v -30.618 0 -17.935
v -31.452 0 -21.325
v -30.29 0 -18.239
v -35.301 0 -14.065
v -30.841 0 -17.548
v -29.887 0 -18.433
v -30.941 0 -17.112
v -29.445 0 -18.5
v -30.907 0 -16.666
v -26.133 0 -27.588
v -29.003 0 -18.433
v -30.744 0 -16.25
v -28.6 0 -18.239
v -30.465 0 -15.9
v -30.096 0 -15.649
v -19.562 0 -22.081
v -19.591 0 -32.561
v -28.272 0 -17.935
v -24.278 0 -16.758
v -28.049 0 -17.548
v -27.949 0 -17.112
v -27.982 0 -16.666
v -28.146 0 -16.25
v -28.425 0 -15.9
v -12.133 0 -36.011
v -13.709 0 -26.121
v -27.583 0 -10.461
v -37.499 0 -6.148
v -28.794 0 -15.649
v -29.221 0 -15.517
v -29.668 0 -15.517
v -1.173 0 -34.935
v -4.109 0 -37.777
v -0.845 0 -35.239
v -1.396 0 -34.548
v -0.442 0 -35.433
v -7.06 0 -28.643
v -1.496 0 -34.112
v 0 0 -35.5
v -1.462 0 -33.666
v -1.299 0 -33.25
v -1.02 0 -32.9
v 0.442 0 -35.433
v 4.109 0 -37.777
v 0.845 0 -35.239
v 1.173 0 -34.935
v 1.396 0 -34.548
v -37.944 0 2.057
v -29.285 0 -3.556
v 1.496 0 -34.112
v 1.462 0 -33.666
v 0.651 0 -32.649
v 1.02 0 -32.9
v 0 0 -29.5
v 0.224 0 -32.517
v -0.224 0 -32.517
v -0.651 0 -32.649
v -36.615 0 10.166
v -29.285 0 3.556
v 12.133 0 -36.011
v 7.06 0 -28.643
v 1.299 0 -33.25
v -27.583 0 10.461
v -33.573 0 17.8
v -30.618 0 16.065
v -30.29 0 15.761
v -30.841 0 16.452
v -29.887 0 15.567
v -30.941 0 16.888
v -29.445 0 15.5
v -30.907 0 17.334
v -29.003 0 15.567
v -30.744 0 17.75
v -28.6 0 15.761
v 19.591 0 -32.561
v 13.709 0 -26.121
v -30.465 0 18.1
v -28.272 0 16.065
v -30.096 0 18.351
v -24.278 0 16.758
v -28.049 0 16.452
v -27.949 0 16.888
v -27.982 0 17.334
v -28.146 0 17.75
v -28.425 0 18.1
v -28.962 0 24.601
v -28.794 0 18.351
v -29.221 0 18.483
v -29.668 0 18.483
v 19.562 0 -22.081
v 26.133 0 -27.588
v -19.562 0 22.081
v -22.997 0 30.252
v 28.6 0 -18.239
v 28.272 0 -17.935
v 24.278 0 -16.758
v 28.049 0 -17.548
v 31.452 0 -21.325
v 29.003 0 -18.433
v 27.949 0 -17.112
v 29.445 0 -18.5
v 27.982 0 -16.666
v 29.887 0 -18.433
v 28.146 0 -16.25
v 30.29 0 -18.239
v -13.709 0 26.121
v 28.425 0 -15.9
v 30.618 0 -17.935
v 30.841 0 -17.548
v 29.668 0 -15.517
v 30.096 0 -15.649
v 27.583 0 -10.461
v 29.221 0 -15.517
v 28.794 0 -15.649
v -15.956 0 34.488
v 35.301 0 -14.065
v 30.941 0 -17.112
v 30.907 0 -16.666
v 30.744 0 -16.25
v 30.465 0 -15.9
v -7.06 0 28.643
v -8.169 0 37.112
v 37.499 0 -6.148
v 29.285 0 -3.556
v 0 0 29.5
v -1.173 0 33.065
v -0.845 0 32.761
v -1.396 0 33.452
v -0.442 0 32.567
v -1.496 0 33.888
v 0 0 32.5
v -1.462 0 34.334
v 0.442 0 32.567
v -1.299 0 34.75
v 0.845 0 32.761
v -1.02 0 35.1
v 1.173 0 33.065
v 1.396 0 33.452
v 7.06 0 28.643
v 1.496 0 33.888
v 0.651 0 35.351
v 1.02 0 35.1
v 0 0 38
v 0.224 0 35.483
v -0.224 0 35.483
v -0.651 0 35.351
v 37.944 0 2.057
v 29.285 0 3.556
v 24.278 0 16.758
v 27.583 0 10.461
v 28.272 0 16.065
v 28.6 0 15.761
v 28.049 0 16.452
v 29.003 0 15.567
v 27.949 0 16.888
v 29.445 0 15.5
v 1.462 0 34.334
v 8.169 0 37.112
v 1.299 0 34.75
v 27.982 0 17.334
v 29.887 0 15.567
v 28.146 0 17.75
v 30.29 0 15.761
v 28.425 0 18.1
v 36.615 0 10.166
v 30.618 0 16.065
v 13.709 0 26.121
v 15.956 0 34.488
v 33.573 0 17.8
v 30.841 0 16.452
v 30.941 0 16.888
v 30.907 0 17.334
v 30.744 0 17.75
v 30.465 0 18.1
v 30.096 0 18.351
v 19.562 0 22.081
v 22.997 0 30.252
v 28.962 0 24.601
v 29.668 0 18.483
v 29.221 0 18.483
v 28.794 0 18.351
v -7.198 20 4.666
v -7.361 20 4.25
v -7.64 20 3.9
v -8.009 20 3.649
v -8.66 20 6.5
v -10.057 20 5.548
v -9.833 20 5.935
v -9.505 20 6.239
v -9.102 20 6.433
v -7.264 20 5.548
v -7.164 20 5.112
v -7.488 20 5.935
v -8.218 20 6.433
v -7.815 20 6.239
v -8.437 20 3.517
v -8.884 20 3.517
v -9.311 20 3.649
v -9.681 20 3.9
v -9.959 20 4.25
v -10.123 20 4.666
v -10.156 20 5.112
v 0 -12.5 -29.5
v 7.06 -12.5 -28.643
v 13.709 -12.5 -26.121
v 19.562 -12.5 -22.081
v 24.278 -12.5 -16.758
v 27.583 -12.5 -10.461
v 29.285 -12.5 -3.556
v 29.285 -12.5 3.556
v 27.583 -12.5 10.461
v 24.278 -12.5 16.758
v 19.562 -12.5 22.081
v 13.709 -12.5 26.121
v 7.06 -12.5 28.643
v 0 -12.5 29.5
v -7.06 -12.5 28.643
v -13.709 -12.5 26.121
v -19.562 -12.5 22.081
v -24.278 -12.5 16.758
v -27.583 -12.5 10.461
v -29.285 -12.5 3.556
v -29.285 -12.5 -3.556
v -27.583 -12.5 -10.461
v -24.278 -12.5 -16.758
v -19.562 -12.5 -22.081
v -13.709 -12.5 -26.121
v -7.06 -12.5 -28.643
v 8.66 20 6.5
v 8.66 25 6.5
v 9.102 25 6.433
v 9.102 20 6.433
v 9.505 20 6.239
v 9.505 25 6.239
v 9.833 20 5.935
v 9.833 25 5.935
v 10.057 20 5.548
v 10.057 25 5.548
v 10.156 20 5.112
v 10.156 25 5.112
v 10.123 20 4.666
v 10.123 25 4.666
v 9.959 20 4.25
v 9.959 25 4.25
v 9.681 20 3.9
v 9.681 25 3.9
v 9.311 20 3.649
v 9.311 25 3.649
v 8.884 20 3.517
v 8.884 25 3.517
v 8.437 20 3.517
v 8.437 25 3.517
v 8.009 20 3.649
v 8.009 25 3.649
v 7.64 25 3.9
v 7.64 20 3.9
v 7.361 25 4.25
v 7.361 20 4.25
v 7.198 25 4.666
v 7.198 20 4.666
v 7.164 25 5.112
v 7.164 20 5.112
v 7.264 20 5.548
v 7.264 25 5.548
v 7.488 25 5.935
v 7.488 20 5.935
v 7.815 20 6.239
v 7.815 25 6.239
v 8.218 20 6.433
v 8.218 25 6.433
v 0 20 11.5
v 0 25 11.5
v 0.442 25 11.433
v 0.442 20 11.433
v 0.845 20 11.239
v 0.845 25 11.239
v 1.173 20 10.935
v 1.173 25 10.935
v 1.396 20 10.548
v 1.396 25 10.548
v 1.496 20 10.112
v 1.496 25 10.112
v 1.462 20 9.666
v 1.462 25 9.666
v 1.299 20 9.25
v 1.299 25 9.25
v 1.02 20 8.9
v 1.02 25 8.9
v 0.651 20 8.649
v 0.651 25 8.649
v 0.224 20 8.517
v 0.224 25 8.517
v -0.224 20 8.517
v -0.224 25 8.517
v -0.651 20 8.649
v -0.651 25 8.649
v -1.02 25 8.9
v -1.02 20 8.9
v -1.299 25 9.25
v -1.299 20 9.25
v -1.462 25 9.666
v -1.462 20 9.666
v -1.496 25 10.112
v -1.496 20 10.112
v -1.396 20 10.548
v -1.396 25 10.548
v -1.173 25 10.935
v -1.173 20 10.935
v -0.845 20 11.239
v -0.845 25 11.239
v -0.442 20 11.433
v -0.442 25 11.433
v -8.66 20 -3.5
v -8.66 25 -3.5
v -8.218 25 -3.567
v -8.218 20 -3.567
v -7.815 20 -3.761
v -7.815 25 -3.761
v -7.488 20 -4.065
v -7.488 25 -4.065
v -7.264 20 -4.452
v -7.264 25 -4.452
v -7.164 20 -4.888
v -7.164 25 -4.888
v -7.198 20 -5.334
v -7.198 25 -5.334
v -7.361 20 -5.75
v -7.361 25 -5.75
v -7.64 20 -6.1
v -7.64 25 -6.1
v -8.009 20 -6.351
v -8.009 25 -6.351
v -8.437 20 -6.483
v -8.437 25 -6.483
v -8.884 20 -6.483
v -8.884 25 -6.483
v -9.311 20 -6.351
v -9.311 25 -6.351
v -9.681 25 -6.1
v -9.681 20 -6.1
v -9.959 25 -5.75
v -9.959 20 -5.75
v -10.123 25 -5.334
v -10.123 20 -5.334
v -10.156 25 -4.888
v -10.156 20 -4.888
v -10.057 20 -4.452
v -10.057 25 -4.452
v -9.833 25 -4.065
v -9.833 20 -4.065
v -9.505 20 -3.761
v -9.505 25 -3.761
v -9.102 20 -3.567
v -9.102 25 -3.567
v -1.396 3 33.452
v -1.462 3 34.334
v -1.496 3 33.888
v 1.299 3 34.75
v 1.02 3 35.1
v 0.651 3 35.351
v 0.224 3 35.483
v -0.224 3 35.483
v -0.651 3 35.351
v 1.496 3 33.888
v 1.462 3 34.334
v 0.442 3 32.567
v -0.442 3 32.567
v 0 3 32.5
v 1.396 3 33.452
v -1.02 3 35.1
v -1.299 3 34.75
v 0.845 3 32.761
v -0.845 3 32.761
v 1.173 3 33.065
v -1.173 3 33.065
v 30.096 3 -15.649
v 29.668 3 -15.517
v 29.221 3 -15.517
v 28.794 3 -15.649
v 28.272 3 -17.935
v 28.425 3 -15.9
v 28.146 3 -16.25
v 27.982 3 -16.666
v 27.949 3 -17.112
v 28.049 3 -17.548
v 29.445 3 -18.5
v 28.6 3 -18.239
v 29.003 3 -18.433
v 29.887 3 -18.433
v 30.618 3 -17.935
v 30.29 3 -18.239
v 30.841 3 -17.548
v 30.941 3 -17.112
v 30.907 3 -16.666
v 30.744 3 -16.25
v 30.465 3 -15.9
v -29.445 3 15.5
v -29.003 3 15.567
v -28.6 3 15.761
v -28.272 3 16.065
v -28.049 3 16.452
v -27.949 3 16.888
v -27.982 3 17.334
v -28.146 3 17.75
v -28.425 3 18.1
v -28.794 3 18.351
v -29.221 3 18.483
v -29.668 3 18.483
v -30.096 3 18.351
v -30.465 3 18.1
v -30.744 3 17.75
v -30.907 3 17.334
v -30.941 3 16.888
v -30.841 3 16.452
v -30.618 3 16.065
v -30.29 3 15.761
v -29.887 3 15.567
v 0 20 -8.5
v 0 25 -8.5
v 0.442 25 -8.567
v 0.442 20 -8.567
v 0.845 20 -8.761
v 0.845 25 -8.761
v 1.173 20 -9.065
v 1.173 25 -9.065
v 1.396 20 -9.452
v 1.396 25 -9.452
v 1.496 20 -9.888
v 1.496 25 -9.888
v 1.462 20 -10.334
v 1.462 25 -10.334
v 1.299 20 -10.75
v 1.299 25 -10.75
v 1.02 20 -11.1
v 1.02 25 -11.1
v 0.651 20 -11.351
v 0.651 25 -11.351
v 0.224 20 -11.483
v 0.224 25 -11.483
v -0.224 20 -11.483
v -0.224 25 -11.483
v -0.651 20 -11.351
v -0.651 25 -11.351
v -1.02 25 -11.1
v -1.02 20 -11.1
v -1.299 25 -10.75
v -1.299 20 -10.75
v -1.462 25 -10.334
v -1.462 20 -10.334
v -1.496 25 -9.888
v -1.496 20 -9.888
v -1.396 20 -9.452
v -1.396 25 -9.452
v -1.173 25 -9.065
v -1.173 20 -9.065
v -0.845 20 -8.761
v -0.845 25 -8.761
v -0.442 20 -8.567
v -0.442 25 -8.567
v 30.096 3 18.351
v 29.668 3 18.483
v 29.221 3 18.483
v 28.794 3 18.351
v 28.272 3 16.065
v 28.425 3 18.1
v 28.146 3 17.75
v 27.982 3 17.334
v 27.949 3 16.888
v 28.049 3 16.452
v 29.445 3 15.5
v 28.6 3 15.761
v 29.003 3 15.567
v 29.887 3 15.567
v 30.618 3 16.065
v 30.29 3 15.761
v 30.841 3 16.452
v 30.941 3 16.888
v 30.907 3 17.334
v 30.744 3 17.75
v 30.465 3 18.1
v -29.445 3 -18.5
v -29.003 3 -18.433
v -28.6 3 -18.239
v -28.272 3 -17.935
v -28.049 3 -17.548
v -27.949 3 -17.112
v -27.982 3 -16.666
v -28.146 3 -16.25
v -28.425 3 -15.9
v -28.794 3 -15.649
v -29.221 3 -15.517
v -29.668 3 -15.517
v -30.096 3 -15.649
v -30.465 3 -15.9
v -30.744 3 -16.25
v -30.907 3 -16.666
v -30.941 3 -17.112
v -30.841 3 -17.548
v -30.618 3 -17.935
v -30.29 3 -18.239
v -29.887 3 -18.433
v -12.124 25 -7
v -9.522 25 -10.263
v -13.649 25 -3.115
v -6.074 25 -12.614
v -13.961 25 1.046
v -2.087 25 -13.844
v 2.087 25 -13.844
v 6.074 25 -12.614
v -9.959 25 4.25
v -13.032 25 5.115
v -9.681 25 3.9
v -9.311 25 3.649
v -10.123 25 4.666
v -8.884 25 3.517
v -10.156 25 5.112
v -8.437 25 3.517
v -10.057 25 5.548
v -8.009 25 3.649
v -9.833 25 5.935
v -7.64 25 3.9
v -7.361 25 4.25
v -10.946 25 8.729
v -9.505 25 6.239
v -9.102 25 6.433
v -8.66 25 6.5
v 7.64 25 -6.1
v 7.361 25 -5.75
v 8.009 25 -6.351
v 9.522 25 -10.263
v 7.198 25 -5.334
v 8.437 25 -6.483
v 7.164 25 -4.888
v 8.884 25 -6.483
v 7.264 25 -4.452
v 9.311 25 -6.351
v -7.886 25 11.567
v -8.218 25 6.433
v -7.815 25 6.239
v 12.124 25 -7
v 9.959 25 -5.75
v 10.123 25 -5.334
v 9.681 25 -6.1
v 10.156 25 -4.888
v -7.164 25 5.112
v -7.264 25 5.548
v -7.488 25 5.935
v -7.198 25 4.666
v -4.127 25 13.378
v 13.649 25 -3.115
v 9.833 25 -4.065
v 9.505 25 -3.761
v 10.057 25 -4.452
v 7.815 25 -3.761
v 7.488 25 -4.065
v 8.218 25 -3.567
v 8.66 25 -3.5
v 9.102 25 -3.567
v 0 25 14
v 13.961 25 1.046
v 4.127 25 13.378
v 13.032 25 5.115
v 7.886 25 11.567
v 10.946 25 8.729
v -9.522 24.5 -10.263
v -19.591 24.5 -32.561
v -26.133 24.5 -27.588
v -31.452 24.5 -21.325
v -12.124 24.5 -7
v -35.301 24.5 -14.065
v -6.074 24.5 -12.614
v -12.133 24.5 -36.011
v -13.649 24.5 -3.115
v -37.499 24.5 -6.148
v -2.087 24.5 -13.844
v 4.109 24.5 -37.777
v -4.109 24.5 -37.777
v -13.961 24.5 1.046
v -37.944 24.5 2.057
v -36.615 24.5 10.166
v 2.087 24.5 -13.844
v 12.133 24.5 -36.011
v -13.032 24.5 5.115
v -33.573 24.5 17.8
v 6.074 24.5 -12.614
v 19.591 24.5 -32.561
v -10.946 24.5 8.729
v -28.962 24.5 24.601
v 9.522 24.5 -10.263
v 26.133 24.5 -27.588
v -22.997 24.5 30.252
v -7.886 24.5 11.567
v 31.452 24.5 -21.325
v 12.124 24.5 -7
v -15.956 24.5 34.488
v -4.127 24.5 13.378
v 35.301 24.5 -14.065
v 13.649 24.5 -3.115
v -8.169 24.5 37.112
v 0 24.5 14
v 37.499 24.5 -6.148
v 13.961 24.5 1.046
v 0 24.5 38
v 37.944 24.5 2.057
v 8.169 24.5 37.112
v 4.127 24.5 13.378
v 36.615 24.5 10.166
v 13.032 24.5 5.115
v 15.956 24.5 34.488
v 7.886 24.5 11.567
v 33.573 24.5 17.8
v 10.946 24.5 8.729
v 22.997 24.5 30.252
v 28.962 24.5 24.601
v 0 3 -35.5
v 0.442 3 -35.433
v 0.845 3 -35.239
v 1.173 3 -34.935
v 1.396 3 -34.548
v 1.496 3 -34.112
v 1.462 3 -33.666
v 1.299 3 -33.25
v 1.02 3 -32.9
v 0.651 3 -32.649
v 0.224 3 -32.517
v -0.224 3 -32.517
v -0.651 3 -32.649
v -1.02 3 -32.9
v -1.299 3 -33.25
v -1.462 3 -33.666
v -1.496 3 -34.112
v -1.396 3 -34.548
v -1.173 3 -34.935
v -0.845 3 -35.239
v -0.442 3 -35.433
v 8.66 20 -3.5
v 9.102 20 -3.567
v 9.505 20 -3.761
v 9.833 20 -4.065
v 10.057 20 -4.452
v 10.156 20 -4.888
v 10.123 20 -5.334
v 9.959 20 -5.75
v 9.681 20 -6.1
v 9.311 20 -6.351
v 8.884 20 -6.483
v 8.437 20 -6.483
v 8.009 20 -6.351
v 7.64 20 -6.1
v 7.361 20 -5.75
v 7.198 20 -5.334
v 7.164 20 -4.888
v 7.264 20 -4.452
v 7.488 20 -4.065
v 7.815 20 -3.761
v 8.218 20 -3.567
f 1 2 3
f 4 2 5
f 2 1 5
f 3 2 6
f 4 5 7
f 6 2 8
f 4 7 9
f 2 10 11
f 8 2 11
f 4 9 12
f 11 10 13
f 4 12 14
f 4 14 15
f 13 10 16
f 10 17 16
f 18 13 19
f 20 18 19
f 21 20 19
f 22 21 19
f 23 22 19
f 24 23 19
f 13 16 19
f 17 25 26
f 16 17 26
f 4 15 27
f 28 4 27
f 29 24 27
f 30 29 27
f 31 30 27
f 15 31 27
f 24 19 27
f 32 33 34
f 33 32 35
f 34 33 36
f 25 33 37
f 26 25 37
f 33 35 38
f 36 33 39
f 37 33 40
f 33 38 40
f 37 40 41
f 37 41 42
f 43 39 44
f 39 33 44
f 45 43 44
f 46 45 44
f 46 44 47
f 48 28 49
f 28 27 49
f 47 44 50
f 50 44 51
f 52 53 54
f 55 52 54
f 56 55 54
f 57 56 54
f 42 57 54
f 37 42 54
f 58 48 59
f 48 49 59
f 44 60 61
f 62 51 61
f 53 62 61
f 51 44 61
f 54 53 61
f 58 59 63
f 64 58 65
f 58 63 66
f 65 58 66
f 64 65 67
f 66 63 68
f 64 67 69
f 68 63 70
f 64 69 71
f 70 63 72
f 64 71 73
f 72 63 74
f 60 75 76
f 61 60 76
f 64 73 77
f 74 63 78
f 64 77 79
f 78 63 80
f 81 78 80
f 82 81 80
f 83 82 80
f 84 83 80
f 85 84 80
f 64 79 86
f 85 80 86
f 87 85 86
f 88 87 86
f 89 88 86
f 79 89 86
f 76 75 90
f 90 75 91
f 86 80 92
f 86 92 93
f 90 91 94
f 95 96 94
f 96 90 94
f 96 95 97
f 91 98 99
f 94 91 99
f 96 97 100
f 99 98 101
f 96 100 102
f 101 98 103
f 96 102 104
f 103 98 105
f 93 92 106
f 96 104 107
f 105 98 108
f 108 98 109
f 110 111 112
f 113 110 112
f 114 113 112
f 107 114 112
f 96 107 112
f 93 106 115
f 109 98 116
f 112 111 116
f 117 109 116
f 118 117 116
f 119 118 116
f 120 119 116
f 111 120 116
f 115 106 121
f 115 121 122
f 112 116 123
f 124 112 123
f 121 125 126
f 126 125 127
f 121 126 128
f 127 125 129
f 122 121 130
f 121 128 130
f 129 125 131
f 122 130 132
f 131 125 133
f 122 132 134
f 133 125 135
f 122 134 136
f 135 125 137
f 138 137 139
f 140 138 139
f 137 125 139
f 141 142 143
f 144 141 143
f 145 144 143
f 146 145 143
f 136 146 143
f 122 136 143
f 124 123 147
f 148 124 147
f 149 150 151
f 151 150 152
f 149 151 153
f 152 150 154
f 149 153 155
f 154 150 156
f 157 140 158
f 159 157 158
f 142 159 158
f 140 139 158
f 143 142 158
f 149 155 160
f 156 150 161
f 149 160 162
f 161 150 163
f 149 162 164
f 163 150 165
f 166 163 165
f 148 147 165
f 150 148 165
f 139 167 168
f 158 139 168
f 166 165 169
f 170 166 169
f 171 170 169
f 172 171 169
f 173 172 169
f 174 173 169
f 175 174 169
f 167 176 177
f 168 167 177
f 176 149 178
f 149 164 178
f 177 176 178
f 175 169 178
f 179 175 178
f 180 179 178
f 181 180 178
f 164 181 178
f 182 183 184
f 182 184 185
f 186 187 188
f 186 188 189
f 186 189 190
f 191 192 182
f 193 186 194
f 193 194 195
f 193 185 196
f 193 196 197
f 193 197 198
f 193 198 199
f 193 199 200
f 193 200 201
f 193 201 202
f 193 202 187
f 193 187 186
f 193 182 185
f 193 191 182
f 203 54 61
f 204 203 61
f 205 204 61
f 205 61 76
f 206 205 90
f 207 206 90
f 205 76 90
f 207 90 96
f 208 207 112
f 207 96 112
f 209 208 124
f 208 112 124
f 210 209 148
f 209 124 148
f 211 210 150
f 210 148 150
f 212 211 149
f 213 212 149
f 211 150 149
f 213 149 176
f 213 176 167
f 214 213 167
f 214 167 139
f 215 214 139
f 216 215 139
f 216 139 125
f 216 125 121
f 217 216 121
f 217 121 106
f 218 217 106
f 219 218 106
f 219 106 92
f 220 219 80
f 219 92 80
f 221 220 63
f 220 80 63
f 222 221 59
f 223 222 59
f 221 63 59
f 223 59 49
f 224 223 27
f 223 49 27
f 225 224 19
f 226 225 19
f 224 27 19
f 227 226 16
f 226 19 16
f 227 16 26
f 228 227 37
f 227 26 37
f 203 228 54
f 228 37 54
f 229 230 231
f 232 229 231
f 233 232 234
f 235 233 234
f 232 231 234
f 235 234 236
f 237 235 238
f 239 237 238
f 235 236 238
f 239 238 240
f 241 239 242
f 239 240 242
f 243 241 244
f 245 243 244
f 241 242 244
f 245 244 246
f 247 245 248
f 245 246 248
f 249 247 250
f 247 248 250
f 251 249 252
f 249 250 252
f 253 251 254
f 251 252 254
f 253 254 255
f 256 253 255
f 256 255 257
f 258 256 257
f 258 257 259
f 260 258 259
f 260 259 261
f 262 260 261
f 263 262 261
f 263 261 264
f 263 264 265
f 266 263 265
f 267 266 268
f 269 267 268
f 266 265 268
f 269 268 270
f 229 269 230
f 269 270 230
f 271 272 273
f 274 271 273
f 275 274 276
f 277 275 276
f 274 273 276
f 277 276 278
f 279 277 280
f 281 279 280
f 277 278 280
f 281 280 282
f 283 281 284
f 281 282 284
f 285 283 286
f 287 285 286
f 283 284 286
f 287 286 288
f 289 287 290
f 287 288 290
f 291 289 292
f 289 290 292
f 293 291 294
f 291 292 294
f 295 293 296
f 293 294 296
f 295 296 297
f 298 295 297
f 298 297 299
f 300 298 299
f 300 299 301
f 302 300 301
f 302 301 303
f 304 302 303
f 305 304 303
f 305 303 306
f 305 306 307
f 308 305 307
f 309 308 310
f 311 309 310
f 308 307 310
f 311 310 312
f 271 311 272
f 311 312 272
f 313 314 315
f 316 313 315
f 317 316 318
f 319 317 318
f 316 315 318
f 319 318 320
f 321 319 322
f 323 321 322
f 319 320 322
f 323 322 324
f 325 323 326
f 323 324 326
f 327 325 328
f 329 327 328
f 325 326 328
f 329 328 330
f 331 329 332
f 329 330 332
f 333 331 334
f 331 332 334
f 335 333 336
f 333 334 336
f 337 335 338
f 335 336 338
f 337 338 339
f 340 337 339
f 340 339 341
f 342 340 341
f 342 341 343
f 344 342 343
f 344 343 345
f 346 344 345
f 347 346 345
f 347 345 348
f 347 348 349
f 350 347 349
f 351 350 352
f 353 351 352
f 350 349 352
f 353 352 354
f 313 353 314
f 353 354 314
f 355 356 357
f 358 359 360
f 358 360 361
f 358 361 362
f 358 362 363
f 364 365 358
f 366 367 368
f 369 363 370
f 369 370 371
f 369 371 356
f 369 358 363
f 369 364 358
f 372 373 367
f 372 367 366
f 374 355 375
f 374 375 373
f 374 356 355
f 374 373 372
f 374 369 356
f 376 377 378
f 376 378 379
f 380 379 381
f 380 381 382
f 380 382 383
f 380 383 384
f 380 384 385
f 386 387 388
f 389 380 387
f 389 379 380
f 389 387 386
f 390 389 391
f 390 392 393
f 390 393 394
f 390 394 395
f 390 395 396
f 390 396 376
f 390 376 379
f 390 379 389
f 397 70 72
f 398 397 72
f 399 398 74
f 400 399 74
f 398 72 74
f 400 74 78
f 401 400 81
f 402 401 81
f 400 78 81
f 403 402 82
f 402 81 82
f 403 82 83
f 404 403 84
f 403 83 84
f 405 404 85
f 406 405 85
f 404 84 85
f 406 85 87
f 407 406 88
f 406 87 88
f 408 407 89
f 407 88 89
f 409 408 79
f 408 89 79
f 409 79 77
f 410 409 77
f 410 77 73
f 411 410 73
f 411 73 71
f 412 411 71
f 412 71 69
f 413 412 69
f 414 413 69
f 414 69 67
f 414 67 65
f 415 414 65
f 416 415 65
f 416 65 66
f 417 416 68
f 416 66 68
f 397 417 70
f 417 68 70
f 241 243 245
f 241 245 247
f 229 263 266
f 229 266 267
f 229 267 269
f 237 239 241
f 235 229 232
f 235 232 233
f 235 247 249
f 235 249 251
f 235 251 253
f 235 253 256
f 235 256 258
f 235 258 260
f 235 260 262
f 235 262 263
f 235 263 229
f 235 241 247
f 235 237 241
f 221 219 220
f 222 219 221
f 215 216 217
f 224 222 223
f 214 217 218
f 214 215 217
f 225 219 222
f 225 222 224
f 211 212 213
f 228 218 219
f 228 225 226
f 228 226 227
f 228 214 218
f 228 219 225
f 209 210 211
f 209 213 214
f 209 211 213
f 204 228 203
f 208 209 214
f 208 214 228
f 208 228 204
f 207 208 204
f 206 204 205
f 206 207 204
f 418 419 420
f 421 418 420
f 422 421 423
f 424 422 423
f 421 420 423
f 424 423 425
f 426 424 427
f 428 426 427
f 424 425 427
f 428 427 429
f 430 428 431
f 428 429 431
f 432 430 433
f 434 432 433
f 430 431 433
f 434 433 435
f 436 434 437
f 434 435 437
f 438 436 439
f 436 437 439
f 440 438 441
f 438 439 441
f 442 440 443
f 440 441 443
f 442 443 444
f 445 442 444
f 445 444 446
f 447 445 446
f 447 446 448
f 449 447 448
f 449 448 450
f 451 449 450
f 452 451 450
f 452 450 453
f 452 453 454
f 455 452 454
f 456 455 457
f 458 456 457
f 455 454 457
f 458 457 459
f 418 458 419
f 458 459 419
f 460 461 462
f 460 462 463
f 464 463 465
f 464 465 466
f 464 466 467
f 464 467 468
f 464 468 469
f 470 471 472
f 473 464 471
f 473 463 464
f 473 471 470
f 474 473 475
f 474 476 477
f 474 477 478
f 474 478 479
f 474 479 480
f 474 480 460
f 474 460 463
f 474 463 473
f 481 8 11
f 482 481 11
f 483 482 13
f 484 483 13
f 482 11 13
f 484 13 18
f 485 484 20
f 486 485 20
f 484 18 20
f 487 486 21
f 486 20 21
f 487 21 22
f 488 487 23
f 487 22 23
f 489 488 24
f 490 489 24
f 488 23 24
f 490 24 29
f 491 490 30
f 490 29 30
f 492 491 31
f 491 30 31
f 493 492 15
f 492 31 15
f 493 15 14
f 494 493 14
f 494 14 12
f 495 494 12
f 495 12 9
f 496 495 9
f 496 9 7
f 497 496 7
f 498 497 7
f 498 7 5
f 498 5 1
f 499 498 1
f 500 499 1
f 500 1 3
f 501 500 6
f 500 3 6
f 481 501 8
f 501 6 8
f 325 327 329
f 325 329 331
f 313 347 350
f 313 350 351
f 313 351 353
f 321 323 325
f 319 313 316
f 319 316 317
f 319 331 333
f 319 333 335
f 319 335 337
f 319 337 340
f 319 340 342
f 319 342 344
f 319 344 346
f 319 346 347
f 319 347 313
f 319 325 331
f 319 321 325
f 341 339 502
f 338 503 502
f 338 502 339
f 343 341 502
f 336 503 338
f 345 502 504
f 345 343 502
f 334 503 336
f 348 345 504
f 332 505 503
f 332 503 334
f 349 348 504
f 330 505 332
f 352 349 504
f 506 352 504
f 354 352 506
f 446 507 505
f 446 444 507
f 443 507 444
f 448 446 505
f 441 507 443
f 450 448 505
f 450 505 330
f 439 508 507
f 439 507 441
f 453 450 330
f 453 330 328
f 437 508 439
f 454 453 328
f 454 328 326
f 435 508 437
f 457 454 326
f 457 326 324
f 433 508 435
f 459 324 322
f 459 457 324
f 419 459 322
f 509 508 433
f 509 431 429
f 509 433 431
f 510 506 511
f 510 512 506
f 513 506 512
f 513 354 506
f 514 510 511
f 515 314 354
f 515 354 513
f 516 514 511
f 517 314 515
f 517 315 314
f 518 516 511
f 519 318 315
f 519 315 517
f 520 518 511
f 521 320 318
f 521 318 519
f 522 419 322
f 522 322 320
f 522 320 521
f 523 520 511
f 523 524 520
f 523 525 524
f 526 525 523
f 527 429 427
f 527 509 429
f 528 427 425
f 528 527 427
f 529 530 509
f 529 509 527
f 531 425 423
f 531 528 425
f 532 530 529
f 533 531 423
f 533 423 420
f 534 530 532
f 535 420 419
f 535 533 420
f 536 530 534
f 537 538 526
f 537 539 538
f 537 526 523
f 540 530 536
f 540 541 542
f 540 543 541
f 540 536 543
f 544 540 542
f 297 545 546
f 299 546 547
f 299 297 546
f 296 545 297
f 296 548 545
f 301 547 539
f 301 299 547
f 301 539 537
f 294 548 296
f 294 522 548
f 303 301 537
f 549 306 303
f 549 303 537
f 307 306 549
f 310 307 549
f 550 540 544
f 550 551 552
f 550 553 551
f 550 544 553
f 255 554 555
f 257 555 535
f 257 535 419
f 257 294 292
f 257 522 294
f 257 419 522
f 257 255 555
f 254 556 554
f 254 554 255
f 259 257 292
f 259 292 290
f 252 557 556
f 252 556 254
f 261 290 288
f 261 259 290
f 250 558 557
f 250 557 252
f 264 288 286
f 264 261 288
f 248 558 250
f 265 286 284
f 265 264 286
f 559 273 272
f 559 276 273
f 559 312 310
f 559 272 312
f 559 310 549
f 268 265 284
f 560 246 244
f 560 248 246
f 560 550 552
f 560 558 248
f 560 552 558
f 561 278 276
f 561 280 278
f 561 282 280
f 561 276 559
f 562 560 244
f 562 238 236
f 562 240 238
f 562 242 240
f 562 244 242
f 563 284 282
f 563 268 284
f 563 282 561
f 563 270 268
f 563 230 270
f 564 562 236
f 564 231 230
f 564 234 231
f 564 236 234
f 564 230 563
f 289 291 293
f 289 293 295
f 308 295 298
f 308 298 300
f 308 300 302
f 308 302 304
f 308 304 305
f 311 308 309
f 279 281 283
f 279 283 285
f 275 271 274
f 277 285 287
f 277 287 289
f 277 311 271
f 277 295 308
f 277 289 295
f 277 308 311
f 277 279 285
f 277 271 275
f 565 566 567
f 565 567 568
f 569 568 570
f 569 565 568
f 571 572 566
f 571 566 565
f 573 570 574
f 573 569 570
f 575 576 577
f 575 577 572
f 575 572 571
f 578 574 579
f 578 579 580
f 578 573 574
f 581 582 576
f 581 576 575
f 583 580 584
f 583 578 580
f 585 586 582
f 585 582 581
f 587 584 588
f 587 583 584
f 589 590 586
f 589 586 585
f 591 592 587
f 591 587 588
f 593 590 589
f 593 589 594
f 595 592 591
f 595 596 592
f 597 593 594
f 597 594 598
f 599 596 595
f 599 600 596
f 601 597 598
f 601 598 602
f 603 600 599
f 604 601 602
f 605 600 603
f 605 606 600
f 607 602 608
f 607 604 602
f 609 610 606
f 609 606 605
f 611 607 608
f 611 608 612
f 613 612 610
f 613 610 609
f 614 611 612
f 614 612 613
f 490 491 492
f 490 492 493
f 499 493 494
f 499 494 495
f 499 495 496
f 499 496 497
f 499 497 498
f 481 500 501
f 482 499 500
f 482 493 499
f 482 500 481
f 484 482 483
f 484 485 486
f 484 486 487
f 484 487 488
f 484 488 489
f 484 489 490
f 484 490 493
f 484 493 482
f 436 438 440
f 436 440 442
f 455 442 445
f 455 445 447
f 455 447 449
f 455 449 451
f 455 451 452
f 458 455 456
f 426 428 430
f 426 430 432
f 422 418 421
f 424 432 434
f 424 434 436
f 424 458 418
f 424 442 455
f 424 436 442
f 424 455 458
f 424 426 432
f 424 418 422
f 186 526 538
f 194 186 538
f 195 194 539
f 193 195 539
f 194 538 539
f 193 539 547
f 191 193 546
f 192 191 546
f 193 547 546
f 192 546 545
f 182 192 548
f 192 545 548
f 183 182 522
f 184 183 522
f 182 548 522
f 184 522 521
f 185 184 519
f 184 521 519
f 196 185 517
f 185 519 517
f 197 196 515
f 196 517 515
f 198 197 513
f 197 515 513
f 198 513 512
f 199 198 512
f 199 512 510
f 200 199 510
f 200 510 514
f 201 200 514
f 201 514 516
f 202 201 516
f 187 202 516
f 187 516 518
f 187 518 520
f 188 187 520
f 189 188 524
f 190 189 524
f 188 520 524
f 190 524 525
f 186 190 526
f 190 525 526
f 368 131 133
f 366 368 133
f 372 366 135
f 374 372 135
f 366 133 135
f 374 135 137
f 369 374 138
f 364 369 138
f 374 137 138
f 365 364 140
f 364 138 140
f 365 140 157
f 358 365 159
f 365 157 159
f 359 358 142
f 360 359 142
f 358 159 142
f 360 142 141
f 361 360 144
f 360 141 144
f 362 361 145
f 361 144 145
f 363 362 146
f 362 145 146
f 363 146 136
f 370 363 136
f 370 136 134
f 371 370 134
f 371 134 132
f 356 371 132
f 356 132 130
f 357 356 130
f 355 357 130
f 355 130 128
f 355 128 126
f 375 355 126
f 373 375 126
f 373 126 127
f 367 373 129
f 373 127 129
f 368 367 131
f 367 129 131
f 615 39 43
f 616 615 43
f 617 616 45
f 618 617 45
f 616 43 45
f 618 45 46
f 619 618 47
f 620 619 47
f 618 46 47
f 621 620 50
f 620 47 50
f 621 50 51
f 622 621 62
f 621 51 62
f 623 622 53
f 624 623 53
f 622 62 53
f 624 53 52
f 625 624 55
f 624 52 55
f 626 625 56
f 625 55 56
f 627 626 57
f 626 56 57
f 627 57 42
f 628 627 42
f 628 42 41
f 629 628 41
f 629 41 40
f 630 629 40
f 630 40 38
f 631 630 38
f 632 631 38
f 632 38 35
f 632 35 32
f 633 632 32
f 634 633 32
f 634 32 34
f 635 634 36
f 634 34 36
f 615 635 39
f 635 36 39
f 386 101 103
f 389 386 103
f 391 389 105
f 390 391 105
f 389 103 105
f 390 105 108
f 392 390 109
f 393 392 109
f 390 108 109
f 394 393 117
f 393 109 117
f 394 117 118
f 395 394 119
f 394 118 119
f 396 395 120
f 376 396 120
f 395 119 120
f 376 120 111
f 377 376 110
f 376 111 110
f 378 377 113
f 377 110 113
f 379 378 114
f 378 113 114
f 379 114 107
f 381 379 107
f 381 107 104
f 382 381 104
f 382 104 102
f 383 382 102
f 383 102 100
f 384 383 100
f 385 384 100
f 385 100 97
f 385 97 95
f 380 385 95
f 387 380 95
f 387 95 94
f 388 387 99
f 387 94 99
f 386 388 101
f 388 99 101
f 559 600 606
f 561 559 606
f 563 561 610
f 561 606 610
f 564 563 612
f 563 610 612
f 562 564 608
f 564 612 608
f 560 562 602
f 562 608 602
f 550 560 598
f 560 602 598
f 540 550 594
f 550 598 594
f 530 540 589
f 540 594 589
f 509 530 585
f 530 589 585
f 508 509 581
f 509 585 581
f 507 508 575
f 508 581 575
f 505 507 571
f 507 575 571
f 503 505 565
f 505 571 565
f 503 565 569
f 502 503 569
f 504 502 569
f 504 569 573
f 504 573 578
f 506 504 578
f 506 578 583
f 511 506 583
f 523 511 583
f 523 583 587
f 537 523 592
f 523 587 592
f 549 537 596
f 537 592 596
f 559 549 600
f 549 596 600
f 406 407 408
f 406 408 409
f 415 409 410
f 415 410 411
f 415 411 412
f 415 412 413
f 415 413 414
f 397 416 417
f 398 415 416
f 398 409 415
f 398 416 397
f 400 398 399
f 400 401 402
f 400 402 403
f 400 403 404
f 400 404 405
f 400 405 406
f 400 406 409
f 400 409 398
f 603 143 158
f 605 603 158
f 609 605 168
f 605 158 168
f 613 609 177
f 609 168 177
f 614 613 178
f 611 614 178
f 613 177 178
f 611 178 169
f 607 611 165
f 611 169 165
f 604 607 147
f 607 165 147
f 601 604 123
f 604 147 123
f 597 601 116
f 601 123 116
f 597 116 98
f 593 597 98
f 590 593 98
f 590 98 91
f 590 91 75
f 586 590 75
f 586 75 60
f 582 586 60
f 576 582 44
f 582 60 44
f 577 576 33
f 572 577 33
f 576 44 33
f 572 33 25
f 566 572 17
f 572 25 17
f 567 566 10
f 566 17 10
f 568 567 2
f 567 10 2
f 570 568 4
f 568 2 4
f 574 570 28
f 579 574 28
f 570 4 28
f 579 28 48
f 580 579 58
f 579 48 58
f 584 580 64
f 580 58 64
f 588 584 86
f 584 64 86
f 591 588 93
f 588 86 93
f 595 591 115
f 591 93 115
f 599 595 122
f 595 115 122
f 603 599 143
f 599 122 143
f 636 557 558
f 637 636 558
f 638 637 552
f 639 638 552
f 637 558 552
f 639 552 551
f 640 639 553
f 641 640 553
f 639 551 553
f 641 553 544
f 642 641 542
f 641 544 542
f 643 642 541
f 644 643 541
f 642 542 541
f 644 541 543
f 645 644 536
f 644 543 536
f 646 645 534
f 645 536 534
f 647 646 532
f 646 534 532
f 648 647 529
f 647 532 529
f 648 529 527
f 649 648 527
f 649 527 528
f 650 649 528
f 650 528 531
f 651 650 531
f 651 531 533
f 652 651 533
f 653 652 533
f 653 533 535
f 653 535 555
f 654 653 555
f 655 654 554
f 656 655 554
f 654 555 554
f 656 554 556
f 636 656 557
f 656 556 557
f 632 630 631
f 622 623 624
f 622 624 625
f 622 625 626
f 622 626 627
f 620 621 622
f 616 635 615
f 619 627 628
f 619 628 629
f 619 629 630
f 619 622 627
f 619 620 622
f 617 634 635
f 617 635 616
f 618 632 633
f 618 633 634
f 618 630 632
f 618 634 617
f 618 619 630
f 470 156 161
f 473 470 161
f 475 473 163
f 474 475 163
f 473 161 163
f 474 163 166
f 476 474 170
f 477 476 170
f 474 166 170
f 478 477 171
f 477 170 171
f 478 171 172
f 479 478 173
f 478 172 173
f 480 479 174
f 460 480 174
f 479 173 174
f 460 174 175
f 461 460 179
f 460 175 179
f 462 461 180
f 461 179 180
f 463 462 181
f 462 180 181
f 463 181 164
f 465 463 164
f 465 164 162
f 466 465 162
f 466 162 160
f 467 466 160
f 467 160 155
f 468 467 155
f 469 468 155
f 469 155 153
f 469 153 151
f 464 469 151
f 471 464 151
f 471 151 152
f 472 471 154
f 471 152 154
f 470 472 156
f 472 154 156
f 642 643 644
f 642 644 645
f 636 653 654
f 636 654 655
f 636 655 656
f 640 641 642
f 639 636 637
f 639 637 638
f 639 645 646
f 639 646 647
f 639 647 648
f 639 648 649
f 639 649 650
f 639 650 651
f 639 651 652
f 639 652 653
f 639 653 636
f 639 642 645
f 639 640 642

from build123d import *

# Parameters (mm, degrees)
SKETCH1_R           = 38
BOSS_EXTRUDE1_DEPTH = 24.5
SKETCH2_R           = 14
BOSS_EXTRUDE2_DEPTH = 0.5
SKETCH3_R           = 29.5
BOSS_EXTRUDE3_DEPTH = 12.5
SKETCH4_R           = 1.5
CUT_EXTRUDE1_DEPTH  = 5
SKETCH8_R           = 1.5
CUT_EXTRUDE3_DEPTH  = 3


with BuildPart() as part:
    # Sketch1 → Boss-Extrude1 (new body)
    with BuildSketch(Plane(origin=(0, 0, 0), x_dir=(1, 0, 0), z_dir=(0, 1, 0))):
        with Locations(Location((0, 0, 0), (0, 0, 270))):
            Circle(SKETCH1_R)
    extrude(amount=BOSS_EXTRUDE1_DEPTH)

    # Sketch2 → Boss-Extrude2 (add)
    with BuildSketch(Plane(origin=(0, 24.5, 0), x_dir=(1, 0, 0), z_dir=(0, 1, 0))):
        with Locations(Location((0, 0, 0), (0, 0, 270))):
            Circle(SKETCH2_R)
    extrude(amount=BOSS_EXTRUDE2_DEPTH)

    # Sketch3 → Boss-Extrude3 (add)
    with BuildSketch(Plane.XZ):
        with Locations(Location((0, 0, 0), (0, 0, 270))):
            Circle(SKETCH3_R)
    extrude(amount=BOSS_EXTRUDE3_DEPTH)

    # Sketch4 → Cut-Extrude1 (cut)
    with BuildSketch(Plane(origin=(0, 25, 0), x_dir=(1, 0, 0), z_dir=(0, 1, 0))):
        with Locations(Location((0, 10, 0), (0, 0, 270))):
            Circle(SKETCH4_R)
        with Locations(Location((8.660254038, 5, 0), (0, 0, 270))):
            Circle(SKETCH4_R)
        with Locations(Location((8.660254038, -5, 0), (0, 0, 270))):
            Circle(SKETCH4_R)
        with Locations(Location((0, -10, 0), (0, 0, 270))):
            Circle(SKETCH4_R)
        with Locations(Location((-8.660254038, -5, 0), (0, 0, 270))):
            Circle(SKETCH4_R)
        with Locations(Location((-8.660254038, 5, 0), (0, 0, 270))):
            Circle(SKETCH4_R)
    extrude(amount=-CUT_EXTRUDE1_DEPTH, mode=Mode.SUBTRACT)

    # Sketch8 → Cut-Extrude3 (cut)
    with BuildSketch(Plane.XZ):
        with Locations(Location((0, 34, 0), (0, 0, 270))):
            Circle(SKETCH8_R)
        with Locations(Location((29.444863729, 17, 0), (0, 0, 270))):
            Circle(SKETCH8_R)
        with Locations(Location((29.444863729, -17, 0), (0, 0, 270))):
            Circle(SKETCH8_R)
        with Locations(Location((0, -34, 0), (0, 0, 270))):
            Circle(SKETCH8_R)
        with Locations(Location((-29.444863729, -17, 0), (0, 0, 270))):
            Circle(SKETCH8_R)
        with Locations(Location((-29.444863729, 17, 0), (0, 0, 270))):
            Circle(SKETCH8_R)
    extrude(amount=-CUT_EXTRUDE3_DEPTH, mode=Mode.SUBTRACT)


solid = part.part
